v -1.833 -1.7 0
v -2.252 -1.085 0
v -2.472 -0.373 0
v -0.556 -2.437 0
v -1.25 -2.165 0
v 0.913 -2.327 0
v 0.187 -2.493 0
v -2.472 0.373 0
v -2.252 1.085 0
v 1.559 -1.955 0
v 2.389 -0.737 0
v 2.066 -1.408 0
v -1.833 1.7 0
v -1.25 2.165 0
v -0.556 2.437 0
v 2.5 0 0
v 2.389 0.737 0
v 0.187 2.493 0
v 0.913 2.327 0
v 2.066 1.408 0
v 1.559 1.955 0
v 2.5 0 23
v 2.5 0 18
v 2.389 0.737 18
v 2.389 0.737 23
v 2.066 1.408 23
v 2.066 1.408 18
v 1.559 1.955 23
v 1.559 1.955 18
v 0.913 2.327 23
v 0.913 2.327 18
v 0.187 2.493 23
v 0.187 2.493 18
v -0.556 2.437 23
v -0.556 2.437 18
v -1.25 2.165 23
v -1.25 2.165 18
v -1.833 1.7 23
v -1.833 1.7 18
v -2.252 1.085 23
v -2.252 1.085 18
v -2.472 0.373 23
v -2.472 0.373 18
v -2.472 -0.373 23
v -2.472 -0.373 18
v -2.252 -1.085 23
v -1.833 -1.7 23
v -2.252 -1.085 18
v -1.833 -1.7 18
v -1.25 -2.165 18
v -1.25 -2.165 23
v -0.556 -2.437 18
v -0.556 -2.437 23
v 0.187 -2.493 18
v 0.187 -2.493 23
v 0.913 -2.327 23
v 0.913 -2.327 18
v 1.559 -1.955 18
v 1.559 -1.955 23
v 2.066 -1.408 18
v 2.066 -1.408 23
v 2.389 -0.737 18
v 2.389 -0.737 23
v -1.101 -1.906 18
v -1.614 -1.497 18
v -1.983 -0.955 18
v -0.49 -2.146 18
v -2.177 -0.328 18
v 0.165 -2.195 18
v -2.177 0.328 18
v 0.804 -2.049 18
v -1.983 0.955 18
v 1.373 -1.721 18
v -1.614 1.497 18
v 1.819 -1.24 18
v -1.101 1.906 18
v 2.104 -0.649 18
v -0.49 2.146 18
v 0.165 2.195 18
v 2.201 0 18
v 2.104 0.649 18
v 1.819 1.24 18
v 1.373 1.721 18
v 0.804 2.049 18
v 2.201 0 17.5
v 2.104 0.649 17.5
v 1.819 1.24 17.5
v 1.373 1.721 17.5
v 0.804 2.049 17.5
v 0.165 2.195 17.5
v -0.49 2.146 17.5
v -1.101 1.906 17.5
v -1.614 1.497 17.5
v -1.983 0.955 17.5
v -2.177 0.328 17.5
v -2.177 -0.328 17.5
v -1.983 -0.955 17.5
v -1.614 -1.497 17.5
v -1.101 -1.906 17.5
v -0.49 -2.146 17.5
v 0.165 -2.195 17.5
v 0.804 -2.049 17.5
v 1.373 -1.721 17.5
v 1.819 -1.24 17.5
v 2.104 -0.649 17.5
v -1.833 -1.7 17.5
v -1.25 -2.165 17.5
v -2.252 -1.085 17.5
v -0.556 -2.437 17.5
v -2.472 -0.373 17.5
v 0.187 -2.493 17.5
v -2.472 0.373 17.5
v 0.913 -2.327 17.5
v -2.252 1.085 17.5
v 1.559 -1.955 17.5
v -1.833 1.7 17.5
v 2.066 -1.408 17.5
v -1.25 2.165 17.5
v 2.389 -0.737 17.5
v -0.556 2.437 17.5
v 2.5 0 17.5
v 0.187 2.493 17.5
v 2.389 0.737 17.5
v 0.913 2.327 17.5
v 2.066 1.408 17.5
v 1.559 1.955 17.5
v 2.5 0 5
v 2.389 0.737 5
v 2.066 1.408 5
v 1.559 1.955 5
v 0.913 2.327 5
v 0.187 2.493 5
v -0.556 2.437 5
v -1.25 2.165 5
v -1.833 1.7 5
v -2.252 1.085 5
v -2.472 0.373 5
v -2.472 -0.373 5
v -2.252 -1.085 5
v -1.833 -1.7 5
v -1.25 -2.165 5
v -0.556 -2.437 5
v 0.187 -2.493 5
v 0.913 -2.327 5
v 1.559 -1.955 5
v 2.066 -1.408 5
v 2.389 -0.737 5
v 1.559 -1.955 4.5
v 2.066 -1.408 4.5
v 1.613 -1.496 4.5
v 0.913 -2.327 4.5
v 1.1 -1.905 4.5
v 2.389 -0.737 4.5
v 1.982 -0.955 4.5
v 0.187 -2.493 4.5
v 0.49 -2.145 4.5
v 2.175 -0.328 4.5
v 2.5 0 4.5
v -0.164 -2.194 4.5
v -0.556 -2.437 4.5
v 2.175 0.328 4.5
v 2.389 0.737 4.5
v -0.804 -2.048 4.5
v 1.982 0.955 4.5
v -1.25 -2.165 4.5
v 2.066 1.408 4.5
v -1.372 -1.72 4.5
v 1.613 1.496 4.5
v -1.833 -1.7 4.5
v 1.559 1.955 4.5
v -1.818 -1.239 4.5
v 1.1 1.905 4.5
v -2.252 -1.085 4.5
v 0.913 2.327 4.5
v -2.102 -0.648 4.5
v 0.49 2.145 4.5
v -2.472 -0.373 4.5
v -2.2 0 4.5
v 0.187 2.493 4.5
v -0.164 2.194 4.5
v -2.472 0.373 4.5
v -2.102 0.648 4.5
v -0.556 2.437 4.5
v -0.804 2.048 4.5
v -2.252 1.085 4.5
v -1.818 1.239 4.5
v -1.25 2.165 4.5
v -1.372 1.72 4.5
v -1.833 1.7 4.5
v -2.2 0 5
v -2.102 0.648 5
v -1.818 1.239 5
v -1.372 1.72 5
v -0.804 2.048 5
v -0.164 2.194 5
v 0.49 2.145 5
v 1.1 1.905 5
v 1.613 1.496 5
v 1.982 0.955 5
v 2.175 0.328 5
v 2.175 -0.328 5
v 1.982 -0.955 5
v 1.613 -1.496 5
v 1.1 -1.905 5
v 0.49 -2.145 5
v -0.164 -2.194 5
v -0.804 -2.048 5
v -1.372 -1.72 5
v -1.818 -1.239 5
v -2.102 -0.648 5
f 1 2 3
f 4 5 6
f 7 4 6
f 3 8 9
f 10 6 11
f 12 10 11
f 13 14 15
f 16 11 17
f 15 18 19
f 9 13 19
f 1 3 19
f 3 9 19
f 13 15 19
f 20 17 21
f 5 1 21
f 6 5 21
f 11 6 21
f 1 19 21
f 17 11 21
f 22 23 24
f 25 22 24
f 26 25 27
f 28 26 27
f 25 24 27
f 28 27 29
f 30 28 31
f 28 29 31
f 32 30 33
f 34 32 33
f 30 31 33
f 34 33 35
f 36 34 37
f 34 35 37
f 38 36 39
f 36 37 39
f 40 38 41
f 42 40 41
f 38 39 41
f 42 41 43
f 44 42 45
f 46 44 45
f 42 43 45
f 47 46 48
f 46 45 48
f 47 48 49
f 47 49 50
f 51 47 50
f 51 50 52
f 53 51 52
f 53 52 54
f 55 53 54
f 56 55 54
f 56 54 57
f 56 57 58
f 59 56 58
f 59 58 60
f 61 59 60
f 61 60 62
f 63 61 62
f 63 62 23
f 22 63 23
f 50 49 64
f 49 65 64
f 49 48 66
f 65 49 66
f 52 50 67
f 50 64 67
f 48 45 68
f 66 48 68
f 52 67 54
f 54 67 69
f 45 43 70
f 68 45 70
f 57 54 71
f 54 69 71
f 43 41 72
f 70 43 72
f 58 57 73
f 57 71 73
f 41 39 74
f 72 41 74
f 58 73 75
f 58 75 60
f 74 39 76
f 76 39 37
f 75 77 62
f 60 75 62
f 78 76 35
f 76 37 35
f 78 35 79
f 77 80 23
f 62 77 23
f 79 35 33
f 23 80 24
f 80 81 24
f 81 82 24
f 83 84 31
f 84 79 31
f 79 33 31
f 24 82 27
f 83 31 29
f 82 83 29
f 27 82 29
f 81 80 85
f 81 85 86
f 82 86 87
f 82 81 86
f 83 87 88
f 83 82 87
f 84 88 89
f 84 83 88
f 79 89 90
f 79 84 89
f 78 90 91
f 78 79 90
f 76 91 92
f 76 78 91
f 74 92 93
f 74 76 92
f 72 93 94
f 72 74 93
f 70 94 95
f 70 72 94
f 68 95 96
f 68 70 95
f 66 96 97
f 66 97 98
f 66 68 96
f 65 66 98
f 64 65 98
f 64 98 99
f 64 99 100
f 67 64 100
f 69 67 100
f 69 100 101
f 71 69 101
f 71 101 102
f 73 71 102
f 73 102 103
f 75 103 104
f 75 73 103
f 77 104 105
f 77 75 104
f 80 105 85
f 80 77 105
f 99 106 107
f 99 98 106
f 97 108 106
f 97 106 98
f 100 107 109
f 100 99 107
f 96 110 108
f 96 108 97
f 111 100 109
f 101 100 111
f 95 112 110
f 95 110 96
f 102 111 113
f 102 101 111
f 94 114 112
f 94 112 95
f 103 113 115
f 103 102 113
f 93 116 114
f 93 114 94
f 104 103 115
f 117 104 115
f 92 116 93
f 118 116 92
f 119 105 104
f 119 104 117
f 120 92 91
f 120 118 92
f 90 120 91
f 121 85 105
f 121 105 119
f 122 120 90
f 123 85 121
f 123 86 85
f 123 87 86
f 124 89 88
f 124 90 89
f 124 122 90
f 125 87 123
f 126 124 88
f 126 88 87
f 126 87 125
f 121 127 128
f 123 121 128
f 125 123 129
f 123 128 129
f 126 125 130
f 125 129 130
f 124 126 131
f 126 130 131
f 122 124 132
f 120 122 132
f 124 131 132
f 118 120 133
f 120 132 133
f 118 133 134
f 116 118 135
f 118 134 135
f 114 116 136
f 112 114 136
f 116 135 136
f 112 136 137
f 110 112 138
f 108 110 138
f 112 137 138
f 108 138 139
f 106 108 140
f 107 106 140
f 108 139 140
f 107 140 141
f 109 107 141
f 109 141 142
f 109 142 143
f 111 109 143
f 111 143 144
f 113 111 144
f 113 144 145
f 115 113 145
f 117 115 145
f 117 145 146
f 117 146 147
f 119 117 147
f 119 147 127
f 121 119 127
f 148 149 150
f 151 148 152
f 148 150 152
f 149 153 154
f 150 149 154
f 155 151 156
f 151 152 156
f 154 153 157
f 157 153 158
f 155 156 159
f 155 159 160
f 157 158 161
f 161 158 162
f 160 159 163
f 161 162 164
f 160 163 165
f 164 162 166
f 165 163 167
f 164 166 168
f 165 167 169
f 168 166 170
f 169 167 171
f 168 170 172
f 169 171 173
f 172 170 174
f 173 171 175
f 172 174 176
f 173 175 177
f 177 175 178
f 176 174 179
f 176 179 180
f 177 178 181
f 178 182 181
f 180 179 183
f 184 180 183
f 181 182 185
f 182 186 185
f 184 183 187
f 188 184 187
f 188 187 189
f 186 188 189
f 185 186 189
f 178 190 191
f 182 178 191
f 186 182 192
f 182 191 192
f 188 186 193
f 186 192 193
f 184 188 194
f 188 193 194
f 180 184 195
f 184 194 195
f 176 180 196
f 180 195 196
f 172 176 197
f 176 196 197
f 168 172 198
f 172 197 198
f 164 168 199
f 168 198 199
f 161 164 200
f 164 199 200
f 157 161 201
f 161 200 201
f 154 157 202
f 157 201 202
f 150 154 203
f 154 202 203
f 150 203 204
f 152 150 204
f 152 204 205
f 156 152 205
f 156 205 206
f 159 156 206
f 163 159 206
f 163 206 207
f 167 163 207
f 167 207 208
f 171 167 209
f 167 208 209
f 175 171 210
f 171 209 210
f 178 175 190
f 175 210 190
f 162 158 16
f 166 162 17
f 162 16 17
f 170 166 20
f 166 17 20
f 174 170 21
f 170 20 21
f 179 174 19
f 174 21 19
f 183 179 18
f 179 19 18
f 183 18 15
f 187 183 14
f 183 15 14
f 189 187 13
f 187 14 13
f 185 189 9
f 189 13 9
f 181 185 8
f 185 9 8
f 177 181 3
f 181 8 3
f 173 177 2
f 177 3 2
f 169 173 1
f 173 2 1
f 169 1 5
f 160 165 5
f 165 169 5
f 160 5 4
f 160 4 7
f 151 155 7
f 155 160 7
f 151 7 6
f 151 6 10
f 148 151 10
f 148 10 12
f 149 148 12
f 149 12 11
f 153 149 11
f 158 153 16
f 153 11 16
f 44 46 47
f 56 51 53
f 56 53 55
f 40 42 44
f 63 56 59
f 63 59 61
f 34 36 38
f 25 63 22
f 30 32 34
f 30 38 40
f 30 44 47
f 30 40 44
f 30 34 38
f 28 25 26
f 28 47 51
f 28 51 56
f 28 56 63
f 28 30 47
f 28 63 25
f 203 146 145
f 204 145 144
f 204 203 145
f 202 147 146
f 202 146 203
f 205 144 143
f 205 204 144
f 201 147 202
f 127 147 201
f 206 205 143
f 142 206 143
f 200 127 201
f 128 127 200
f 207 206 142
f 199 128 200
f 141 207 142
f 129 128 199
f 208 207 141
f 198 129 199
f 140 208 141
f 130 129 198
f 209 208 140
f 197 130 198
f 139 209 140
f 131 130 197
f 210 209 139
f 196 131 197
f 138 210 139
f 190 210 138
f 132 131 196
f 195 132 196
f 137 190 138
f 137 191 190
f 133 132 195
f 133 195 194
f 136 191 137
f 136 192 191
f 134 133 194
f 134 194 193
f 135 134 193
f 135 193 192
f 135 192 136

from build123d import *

# Parameters (mm, degrees)
SKETCH1_R                  = 2.5
BOSS_EXTRUDE1_DEPTH        = 23
WYTNIJ_WYCI_GNI_CIE1_START = -5
SZKIC1_R                   = 2.5
SZKIC1_R_2                 = 2.201367386
WYTNIJ_WYCI_GNI_CIE1_DEPTH = 0.5
WYTNIJ_WYCI_GNI_CIE2_START = -5
SZKIC2_R                   = 2.5
SZKIC2_R_2                 = 2.2
WYTNIJ_WYCI_GNI_CIE2_DEPTH = 0.5


with BuildPart() as part:
    # Sketch1 → Boss-Extrude1 (new body)
    with BuildSketch(Plane.XY):
        Circle(SKETCH1_R)
    extrude(amount=BOSS_EXTRUDE1_DEPTH)

    # Szkic1 → Wytnij-wyciągnięcie1 (cut)
    with BuildSketch(Plane.XY.offset(23).offset(WYTNIJ_WYCI_GNI_CIE1_START)):
        Circle(SZKIC1_R)
        Circle(SZKIC1_R_2, mode=Mode.SUBTRACT)
    extrude(amount=-WYTNIJ_WYCI_GNI_CIE1_DEPTH, mode=Mode.SUBTRACT)

    # Szkic2 → Wytnij-wyciągnięcie2 (cut)
    with BuildSketch(Plane(origin=(0, 0, 0), x_dir=(-1, 0, 0), z_dir=(0, 0, -1)).offset(WYTNIJ_WYCI_GNI_CIE2_START)):
        Circle(SZKIC2_R)
        Circle(SZKIC2_R_2, mode=Mode.SUBTRACT)
    extrude(amount=WYTNIJ_WYCI_GNI_CIE2_DEPTH, mode=Mode.SUBTRACT)


solid = part.part
